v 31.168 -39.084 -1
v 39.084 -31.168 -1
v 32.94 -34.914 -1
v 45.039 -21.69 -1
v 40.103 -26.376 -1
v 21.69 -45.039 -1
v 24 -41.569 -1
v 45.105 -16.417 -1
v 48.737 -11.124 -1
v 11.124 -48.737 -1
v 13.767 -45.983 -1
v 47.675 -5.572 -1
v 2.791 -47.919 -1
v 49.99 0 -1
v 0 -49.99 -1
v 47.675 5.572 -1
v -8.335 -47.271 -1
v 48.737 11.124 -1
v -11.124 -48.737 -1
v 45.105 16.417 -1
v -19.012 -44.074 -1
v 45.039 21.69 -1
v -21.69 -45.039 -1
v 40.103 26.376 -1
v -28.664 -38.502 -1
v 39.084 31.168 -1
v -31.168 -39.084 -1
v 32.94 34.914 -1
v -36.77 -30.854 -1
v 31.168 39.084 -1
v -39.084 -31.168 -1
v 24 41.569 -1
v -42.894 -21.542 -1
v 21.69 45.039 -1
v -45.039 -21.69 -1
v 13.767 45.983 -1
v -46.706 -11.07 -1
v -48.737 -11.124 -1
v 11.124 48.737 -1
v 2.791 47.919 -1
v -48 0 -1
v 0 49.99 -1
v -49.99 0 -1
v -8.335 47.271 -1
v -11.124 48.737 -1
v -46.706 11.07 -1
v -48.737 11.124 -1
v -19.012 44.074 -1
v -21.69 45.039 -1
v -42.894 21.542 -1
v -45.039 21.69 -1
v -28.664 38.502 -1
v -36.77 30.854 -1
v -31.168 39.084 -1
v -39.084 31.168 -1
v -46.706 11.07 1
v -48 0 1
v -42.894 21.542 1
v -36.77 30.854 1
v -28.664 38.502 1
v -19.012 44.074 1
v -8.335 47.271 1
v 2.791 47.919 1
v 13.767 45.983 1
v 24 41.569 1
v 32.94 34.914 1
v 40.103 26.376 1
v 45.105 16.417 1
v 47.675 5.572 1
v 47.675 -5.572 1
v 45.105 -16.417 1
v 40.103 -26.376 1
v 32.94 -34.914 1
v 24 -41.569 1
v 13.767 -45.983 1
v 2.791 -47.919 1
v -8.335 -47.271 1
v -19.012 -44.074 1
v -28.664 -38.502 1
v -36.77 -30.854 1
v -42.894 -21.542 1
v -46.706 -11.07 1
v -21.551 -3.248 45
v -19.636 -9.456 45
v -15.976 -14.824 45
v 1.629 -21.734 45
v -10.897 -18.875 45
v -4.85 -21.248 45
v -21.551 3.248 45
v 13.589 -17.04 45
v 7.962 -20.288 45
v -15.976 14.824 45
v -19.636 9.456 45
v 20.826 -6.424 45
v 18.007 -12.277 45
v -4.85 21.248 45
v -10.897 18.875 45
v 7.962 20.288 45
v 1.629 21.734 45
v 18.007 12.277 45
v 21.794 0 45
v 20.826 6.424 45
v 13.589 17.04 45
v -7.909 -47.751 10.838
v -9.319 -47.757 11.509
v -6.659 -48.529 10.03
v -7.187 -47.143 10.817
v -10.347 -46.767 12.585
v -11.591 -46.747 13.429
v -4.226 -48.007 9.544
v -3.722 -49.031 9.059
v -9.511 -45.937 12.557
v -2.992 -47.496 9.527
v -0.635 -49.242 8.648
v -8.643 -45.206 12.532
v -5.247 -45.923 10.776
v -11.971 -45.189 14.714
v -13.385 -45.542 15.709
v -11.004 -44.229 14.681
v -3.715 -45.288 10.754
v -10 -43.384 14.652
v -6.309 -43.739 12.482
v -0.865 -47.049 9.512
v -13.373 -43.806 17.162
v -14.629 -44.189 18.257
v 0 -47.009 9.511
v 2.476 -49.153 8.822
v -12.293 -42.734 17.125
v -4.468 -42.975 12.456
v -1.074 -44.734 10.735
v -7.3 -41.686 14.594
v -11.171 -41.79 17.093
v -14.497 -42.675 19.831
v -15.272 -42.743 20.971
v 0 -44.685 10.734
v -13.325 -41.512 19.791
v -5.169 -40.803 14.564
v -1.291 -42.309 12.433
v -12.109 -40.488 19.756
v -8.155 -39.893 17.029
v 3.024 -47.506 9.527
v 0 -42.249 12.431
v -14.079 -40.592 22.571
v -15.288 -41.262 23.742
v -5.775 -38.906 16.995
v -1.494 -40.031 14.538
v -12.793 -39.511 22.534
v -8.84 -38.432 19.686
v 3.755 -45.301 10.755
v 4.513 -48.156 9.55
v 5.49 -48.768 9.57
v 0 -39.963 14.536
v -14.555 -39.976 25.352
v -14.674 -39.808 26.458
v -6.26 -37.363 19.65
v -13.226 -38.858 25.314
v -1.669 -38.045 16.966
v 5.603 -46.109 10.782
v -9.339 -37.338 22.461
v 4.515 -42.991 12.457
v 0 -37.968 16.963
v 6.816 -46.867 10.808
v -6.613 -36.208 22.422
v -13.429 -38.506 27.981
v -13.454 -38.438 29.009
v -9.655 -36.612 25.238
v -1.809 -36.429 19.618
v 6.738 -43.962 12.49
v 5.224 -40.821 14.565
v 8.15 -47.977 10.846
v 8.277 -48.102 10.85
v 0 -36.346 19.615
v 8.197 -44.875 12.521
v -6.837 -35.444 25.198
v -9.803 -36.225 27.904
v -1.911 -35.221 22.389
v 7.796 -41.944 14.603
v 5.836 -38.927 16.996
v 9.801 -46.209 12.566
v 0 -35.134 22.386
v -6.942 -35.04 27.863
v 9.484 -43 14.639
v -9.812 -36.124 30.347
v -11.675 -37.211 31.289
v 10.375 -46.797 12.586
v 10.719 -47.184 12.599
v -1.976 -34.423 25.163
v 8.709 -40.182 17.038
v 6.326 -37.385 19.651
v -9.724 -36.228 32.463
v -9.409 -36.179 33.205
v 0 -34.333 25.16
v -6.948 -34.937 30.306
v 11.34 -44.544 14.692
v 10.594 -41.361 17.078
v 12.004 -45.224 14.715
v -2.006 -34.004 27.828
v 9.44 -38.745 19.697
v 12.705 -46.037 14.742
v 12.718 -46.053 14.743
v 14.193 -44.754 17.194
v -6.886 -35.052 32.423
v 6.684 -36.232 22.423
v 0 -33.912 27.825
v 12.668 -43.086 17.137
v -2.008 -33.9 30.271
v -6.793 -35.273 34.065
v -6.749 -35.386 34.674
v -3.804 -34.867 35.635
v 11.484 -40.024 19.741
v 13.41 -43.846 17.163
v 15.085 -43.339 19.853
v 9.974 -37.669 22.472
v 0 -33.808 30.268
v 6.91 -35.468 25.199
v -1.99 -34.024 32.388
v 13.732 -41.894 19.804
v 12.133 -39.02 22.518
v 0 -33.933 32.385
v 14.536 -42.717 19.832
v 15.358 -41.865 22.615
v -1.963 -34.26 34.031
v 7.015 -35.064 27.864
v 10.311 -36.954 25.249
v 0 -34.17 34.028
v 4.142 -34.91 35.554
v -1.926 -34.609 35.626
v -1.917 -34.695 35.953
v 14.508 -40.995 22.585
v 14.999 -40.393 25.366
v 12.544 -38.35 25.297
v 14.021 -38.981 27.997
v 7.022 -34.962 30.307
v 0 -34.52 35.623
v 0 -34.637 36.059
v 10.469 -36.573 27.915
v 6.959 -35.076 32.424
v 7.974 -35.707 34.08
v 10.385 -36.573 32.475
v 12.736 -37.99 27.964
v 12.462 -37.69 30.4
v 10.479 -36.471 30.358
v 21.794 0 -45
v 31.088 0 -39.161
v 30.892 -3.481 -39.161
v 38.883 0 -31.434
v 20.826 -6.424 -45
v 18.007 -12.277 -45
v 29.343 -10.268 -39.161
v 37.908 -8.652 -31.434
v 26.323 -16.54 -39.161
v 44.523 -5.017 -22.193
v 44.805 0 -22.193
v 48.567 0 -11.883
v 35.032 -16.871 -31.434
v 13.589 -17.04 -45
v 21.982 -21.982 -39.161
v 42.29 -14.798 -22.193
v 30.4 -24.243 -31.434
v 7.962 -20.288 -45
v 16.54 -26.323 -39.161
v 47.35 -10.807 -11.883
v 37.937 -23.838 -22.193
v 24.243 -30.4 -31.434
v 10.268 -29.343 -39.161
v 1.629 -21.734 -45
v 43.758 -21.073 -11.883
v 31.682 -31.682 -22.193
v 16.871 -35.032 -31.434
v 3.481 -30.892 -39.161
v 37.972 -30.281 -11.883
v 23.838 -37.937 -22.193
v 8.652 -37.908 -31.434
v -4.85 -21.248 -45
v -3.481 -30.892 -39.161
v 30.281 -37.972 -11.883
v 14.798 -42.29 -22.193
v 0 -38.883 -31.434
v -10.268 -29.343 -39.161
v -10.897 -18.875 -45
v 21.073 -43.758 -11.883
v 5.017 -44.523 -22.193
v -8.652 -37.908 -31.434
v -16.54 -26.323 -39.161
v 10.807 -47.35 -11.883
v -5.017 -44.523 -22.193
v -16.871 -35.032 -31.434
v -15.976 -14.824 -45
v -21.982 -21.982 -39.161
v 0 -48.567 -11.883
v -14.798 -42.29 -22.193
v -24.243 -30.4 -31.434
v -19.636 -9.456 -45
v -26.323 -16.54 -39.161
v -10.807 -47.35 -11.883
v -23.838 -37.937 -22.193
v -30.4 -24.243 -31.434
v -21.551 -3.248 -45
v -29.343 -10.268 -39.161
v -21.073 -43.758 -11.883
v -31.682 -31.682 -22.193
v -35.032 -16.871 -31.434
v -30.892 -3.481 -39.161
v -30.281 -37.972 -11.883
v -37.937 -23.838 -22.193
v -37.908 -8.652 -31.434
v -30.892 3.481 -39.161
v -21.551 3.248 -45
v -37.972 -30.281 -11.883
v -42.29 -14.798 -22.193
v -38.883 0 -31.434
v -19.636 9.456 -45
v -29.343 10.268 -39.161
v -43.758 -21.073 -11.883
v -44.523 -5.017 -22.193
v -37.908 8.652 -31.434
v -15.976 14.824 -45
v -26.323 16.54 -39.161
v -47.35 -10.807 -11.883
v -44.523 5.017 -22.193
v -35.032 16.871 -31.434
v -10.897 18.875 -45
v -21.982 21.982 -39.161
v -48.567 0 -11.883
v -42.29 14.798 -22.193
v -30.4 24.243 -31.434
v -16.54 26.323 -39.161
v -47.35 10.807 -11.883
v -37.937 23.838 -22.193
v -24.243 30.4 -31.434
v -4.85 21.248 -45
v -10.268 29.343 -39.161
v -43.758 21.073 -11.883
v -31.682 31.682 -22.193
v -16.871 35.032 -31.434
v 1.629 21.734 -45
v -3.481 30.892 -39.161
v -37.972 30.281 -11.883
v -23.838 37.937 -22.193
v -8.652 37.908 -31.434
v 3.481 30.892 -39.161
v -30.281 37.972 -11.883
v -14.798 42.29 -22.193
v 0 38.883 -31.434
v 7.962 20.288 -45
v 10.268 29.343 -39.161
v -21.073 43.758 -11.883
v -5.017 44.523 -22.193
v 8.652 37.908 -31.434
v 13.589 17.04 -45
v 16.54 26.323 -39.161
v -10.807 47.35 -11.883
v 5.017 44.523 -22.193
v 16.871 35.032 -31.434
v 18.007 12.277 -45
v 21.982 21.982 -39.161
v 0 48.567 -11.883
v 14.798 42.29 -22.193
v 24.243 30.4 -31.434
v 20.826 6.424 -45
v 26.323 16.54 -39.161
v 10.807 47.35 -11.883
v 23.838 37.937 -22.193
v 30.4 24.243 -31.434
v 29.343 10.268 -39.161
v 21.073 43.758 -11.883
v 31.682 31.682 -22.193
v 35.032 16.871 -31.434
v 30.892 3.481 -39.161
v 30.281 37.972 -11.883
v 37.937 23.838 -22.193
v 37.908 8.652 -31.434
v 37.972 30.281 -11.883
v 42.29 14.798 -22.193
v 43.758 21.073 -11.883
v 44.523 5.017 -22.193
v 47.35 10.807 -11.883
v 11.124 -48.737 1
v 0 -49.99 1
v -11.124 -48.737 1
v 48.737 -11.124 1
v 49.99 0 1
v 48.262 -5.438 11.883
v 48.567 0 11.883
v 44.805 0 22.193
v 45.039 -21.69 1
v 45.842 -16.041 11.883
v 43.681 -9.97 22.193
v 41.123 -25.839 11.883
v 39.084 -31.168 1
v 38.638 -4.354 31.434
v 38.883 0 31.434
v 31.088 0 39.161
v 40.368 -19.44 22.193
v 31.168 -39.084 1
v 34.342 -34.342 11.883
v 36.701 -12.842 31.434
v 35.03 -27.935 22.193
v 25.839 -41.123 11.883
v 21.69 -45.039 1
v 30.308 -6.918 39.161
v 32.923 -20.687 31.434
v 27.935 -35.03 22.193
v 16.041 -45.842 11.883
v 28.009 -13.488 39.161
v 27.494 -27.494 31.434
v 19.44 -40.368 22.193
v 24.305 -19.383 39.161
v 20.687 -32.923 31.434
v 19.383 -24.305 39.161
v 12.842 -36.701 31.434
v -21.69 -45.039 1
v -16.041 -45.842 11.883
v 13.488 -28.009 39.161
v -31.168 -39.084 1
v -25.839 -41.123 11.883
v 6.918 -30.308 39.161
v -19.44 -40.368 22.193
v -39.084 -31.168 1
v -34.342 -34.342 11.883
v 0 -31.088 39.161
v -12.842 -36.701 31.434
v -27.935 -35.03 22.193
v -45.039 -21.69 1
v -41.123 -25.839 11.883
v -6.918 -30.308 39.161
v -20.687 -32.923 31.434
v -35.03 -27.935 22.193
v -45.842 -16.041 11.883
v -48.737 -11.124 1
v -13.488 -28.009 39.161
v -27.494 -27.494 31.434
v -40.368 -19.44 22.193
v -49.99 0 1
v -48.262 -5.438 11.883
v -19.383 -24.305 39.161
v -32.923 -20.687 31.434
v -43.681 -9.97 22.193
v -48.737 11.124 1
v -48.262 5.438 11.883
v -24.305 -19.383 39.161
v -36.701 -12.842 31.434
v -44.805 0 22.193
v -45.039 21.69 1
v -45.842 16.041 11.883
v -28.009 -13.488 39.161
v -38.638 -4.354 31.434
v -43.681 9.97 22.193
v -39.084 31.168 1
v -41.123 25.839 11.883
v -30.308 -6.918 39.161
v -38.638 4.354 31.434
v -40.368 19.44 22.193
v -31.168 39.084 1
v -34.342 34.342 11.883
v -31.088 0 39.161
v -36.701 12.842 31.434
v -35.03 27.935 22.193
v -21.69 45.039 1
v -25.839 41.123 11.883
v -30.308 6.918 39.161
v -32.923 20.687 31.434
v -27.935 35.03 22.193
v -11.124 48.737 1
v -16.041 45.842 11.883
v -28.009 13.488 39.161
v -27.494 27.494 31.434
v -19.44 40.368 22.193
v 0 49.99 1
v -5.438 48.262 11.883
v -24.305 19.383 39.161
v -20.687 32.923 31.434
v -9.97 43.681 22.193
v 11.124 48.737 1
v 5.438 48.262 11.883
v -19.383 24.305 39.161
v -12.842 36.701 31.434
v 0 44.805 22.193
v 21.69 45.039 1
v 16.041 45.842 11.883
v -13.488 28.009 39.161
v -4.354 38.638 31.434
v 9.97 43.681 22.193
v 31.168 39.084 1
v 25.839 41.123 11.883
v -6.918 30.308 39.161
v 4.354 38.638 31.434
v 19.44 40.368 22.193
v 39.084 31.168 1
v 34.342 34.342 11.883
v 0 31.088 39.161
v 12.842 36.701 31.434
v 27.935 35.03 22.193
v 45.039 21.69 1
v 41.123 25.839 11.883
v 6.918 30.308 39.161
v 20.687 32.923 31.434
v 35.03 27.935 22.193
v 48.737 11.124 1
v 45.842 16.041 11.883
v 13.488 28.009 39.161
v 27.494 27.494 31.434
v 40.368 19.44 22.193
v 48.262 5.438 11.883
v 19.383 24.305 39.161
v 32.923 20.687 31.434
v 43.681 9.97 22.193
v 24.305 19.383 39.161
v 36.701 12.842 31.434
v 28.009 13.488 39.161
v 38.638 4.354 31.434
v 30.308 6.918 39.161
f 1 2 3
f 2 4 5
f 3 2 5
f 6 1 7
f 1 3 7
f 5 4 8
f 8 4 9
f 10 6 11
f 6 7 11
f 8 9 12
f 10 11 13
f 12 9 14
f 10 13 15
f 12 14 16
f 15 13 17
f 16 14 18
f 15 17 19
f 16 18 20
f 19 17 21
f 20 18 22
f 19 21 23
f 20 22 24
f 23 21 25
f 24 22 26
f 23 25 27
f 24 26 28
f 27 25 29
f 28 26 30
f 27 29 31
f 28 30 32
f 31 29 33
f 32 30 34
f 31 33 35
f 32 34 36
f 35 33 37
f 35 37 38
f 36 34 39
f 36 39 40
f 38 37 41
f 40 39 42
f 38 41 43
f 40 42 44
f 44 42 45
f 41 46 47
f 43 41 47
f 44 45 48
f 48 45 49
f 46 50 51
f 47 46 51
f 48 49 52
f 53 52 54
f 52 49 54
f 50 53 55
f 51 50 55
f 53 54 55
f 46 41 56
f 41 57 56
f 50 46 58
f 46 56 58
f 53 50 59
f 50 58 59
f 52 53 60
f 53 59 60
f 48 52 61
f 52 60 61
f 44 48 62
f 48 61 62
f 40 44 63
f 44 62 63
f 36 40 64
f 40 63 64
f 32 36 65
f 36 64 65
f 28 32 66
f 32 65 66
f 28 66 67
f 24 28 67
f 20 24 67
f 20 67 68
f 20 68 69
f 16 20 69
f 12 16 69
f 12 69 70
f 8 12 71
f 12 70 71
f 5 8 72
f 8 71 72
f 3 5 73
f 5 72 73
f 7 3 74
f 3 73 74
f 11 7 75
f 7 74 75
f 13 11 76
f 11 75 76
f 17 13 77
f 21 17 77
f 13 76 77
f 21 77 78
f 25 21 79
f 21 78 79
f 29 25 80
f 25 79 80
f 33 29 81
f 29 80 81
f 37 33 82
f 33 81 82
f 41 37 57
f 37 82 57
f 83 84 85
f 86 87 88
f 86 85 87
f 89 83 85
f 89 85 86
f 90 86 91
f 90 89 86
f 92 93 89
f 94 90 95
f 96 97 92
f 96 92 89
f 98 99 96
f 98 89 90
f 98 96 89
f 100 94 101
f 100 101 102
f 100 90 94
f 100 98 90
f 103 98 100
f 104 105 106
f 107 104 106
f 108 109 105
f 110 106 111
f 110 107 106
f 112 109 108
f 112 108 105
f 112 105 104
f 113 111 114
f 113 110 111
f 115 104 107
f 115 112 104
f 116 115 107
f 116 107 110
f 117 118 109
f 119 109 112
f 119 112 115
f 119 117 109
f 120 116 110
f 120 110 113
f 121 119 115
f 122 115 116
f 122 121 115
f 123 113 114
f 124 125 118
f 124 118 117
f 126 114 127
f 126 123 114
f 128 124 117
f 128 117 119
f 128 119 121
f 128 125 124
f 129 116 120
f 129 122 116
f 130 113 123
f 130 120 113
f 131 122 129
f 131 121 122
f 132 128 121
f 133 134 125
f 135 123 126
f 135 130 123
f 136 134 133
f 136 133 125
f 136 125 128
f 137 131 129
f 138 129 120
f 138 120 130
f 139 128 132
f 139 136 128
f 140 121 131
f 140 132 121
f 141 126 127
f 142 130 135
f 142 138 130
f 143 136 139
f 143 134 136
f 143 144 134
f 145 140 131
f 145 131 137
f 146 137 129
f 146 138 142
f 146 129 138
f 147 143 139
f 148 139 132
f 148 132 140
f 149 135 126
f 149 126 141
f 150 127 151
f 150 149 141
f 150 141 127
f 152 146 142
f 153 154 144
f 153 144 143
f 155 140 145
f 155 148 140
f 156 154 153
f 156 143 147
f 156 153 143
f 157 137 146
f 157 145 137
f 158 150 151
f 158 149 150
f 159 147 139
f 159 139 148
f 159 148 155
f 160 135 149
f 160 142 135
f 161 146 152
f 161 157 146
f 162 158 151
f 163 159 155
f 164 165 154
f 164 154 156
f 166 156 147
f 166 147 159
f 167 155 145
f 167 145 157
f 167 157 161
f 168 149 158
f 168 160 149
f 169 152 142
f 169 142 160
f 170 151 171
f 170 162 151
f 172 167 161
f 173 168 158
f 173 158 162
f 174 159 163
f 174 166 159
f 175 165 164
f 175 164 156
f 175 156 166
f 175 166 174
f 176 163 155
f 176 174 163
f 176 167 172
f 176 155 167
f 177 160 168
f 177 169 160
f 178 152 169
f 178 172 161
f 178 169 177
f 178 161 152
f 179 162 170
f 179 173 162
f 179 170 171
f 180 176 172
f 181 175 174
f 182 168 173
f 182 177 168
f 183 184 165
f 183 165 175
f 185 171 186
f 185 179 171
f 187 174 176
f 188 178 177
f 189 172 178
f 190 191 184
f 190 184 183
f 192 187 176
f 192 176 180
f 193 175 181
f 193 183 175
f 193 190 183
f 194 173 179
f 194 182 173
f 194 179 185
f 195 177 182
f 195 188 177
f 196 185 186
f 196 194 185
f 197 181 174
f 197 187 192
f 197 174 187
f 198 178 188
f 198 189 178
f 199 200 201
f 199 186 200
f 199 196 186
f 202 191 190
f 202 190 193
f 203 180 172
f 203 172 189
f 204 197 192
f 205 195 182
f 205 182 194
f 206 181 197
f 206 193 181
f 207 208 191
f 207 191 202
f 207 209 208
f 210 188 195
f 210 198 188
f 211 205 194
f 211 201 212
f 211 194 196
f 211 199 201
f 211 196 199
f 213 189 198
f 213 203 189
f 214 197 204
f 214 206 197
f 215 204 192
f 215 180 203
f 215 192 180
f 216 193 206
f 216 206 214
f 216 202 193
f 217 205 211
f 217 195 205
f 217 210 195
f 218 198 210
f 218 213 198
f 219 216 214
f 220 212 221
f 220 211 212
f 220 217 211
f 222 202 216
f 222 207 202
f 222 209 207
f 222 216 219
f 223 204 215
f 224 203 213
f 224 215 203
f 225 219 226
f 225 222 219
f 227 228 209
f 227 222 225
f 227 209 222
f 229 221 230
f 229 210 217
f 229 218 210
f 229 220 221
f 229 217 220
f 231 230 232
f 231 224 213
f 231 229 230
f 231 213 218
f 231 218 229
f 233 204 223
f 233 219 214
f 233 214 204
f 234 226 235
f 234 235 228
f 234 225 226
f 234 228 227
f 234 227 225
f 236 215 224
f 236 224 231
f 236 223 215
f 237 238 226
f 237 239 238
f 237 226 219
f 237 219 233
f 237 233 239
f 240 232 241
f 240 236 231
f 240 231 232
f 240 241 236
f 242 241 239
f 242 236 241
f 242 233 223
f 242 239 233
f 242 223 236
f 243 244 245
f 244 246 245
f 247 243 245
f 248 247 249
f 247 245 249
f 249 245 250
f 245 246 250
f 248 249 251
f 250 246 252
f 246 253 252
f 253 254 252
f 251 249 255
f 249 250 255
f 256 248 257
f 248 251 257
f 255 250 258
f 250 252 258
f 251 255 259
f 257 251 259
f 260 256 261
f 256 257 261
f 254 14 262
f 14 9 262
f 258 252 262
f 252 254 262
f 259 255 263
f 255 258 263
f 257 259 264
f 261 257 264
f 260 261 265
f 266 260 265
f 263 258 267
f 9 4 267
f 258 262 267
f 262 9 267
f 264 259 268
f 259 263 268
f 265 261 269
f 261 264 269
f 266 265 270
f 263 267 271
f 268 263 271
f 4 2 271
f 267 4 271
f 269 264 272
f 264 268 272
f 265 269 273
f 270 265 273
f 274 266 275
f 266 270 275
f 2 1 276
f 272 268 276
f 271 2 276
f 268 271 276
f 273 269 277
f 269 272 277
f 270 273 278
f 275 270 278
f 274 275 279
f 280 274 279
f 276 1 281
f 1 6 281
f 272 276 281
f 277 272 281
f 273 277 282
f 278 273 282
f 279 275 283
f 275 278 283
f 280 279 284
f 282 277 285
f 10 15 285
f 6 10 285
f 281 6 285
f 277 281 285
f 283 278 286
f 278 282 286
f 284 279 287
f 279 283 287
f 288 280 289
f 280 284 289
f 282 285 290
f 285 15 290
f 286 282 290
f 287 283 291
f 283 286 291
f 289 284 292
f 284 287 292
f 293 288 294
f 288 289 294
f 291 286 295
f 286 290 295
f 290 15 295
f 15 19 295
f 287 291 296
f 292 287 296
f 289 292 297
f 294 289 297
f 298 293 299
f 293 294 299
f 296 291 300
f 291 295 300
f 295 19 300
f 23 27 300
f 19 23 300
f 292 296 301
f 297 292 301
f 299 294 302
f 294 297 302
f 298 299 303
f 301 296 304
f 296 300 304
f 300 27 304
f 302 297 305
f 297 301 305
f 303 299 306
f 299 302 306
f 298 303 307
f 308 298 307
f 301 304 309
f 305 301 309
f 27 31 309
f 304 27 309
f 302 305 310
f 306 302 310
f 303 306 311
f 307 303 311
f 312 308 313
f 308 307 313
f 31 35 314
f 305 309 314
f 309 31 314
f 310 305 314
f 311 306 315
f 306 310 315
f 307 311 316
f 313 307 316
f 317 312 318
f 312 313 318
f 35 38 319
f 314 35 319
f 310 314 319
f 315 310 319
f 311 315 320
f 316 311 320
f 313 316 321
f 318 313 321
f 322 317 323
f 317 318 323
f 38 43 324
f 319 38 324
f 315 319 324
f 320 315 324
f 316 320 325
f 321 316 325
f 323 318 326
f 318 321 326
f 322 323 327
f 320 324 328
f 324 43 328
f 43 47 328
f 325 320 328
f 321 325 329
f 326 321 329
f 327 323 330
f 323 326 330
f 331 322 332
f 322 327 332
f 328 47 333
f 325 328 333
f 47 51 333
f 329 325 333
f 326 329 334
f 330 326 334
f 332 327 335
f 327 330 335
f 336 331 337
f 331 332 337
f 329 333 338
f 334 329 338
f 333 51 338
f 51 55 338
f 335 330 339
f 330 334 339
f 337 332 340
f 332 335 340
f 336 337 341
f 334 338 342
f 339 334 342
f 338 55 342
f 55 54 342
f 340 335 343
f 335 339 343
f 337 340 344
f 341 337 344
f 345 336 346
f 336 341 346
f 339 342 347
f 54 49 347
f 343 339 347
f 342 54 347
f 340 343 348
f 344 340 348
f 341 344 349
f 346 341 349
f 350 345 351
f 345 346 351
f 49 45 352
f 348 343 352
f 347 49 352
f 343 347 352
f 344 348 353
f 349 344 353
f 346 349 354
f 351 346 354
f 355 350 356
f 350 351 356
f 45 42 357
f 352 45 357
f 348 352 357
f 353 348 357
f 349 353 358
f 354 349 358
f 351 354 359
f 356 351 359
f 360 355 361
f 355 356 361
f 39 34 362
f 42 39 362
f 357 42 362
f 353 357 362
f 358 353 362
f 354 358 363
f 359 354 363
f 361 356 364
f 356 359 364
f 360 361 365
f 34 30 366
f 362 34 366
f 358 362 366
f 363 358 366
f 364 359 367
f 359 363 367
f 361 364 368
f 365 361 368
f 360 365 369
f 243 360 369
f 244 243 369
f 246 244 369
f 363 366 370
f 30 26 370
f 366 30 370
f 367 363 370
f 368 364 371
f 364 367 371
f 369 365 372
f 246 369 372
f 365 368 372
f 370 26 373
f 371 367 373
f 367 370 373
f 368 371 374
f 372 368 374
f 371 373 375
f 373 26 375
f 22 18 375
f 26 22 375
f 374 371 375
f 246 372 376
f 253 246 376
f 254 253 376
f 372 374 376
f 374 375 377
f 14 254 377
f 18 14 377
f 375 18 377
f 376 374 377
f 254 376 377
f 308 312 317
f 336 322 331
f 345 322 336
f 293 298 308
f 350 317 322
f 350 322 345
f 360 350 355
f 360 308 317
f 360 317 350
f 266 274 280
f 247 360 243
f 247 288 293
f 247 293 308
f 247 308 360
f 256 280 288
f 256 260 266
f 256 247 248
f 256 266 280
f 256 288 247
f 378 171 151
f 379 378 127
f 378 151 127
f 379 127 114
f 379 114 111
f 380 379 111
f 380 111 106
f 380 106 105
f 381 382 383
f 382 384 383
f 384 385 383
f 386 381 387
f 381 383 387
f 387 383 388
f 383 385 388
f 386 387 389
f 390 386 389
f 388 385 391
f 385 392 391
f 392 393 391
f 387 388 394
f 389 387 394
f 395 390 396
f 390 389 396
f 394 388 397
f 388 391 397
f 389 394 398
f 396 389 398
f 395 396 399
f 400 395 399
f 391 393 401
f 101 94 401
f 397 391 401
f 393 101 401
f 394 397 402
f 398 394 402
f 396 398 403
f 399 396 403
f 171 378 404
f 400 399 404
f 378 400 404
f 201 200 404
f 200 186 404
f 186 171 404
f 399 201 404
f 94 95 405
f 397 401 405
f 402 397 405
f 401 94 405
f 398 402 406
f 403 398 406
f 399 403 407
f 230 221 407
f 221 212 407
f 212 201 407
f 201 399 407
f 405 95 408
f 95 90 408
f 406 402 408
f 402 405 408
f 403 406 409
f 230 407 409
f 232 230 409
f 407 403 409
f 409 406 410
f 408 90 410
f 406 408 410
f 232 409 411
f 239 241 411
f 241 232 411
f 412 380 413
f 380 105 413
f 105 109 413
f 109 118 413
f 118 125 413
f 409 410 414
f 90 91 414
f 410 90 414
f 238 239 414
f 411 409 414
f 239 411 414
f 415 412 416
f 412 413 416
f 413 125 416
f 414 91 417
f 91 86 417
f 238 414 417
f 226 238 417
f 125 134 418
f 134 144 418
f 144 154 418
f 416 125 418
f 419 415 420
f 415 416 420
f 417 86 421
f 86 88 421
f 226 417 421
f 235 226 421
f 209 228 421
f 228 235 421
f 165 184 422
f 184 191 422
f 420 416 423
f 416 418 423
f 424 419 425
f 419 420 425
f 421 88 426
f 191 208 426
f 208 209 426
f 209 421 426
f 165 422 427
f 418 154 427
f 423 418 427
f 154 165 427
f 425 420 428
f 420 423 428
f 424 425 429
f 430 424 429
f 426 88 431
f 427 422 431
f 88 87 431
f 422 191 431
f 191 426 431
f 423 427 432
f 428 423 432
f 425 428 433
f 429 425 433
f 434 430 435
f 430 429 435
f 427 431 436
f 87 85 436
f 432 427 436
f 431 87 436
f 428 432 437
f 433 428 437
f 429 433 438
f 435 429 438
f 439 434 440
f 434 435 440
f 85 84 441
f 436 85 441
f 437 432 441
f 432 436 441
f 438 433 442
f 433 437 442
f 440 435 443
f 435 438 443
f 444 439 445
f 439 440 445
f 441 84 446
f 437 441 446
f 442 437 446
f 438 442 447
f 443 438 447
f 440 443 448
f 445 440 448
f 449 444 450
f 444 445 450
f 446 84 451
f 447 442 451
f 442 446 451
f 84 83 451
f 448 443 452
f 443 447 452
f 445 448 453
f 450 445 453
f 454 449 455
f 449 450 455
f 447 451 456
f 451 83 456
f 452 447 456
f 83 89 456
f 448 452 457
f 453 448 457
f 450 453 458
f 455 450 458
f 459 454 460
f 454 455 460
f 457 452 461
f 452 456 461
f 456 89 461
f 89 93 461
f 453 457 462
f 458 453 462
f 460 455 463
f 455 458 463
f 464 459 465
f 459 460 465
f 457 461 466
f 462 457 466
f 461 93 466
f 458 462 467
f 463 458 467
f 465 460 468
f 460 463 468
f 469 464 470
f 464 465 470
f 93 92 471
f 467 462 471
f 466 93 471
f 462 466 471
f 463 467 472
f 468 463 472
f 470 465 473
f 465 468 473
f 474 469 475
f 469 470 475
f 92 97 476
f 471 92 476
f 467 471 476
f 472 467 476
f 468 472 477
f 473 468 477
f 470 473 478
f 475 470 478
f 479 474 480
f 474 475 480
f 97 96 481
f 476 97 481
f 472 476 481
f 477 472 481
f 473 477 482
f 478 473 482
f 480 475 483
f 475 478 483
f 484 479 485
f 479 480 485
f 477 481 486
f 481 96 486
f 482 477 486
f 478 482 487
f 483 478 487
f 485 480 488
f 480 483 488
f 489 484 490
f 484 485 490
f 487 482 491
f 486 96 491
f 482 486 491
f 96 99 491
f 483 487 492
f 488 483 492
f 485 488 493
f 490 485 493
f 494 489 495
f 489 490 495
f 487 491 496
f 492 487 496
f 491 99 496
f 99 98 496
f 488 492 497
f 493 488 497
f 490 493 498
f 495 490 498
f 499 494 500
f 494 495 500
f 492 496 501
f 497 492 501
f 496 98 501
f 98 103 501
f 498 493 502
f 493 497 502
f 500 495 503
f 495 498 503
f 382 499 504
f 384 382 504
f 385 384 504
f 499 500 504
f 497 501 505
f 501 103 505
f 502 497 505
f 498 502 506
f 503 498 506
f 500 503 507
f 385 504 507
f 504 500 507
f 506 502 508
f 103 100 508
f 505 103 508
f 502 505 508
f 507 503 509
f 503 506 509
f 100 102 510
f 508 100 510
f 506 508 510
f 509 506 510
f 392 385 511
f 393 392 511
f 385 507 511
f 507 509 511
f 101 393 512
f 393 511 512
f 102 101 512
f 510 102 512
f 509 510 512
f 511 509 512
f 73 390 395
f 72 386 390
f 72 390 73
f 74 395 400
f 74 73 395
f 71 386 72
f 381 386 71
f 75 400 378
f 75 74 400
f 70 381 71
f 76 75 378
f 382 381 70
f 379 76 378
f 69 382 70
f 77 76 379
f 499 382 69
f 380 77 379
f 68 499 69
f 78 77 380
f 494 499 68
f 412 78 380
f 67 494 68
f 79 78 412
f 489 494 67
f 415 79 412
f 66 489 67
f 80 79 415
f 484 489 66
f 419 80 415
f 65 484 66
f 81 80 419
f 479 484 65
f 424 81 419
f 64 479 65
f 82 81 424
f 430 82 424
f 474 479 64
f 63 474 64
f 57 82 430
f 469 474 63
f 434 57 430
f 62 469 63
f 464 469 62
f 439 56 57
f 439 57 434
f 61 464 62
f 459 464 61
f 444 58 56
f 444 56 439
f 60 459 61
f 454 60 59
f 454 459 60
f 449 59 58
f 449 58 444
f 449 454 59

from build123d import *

# Parameters (mm, degrees)
F4_W          = 126.554620702
F4_H          = 16.890758596
F5_DEPTH      = 25
F5_DEPTH_BACK = 25
F6_W          = 22.8272504394
F6_H          = 2


# Not quite as in the source:
# - a pattern or mirror of a feature is missing from the dataset's text; its kind, count and spacing are read off the source's solid


with BuildPart() as f1:
    # F0 (on Front) → F1 (revolve)
    with BuildSketch(Plane.XZ):
        with BuildLine():
            Line((0, 50), (0, -50))
            ThreePointArc((0, -50), (50, 0), (0, 50))
        make_face()
    revolve(axis=Axis((0, 0, 0), (0, 0, -1)))

    # F2 (on Right) → F3 (revolve, cut)
    with BuildSketch(Plane.YZ):
        with BuildLine():
            Line((-55, 52.4620511452), (-56.5292847679, 7.5011055772))
            ThreePointArc((-56.5292847679, 7.5011055772), (-33.8192423865, 29.2351357427), (-55, 52.4620511452))
        make_face()
    revolve(axis=Axis((0, -55.7646423839, 29.9815783612), (0, -0.033993967, -0.9994220381)), mode=Mode.SUBTRACT)

    # F4 (on Front) → F5 (cut, two sides)
    with BuildSketch(Plane.XZ) as f5_sk:
        with Locations((-0.5138665438, 53.445379298)):
            Rectangle(F4_W, F4_H)
    f5 = extrude(amount=-F5_DEPTH, mode=Mode.SUBTRACT) + extrude(f5_sk.sketch, amount=F5_DEPTH_BACK, mode=Mode.SUBTRACT)

    # F5_copies: F5 across plane
    add(f5.mirror(Plane(origin=(0, 0, 0), x_dir=(-1, 0, 0), z_dir=(0, 0, -1))), mode=Mode.SUBTRACT)

    # F6 (on Front) → F7 (revolve, cut)
    with BuildSketch(Plane.XZ):
        with Locations((-59.4136252197, 0)):
            Rectangle(F6_W, F6_H)
    revolve(axis=Axis((0, 0, 0), (0, 0, -1)), mode=Mode.SUBTRACT)


solid = f1.part
